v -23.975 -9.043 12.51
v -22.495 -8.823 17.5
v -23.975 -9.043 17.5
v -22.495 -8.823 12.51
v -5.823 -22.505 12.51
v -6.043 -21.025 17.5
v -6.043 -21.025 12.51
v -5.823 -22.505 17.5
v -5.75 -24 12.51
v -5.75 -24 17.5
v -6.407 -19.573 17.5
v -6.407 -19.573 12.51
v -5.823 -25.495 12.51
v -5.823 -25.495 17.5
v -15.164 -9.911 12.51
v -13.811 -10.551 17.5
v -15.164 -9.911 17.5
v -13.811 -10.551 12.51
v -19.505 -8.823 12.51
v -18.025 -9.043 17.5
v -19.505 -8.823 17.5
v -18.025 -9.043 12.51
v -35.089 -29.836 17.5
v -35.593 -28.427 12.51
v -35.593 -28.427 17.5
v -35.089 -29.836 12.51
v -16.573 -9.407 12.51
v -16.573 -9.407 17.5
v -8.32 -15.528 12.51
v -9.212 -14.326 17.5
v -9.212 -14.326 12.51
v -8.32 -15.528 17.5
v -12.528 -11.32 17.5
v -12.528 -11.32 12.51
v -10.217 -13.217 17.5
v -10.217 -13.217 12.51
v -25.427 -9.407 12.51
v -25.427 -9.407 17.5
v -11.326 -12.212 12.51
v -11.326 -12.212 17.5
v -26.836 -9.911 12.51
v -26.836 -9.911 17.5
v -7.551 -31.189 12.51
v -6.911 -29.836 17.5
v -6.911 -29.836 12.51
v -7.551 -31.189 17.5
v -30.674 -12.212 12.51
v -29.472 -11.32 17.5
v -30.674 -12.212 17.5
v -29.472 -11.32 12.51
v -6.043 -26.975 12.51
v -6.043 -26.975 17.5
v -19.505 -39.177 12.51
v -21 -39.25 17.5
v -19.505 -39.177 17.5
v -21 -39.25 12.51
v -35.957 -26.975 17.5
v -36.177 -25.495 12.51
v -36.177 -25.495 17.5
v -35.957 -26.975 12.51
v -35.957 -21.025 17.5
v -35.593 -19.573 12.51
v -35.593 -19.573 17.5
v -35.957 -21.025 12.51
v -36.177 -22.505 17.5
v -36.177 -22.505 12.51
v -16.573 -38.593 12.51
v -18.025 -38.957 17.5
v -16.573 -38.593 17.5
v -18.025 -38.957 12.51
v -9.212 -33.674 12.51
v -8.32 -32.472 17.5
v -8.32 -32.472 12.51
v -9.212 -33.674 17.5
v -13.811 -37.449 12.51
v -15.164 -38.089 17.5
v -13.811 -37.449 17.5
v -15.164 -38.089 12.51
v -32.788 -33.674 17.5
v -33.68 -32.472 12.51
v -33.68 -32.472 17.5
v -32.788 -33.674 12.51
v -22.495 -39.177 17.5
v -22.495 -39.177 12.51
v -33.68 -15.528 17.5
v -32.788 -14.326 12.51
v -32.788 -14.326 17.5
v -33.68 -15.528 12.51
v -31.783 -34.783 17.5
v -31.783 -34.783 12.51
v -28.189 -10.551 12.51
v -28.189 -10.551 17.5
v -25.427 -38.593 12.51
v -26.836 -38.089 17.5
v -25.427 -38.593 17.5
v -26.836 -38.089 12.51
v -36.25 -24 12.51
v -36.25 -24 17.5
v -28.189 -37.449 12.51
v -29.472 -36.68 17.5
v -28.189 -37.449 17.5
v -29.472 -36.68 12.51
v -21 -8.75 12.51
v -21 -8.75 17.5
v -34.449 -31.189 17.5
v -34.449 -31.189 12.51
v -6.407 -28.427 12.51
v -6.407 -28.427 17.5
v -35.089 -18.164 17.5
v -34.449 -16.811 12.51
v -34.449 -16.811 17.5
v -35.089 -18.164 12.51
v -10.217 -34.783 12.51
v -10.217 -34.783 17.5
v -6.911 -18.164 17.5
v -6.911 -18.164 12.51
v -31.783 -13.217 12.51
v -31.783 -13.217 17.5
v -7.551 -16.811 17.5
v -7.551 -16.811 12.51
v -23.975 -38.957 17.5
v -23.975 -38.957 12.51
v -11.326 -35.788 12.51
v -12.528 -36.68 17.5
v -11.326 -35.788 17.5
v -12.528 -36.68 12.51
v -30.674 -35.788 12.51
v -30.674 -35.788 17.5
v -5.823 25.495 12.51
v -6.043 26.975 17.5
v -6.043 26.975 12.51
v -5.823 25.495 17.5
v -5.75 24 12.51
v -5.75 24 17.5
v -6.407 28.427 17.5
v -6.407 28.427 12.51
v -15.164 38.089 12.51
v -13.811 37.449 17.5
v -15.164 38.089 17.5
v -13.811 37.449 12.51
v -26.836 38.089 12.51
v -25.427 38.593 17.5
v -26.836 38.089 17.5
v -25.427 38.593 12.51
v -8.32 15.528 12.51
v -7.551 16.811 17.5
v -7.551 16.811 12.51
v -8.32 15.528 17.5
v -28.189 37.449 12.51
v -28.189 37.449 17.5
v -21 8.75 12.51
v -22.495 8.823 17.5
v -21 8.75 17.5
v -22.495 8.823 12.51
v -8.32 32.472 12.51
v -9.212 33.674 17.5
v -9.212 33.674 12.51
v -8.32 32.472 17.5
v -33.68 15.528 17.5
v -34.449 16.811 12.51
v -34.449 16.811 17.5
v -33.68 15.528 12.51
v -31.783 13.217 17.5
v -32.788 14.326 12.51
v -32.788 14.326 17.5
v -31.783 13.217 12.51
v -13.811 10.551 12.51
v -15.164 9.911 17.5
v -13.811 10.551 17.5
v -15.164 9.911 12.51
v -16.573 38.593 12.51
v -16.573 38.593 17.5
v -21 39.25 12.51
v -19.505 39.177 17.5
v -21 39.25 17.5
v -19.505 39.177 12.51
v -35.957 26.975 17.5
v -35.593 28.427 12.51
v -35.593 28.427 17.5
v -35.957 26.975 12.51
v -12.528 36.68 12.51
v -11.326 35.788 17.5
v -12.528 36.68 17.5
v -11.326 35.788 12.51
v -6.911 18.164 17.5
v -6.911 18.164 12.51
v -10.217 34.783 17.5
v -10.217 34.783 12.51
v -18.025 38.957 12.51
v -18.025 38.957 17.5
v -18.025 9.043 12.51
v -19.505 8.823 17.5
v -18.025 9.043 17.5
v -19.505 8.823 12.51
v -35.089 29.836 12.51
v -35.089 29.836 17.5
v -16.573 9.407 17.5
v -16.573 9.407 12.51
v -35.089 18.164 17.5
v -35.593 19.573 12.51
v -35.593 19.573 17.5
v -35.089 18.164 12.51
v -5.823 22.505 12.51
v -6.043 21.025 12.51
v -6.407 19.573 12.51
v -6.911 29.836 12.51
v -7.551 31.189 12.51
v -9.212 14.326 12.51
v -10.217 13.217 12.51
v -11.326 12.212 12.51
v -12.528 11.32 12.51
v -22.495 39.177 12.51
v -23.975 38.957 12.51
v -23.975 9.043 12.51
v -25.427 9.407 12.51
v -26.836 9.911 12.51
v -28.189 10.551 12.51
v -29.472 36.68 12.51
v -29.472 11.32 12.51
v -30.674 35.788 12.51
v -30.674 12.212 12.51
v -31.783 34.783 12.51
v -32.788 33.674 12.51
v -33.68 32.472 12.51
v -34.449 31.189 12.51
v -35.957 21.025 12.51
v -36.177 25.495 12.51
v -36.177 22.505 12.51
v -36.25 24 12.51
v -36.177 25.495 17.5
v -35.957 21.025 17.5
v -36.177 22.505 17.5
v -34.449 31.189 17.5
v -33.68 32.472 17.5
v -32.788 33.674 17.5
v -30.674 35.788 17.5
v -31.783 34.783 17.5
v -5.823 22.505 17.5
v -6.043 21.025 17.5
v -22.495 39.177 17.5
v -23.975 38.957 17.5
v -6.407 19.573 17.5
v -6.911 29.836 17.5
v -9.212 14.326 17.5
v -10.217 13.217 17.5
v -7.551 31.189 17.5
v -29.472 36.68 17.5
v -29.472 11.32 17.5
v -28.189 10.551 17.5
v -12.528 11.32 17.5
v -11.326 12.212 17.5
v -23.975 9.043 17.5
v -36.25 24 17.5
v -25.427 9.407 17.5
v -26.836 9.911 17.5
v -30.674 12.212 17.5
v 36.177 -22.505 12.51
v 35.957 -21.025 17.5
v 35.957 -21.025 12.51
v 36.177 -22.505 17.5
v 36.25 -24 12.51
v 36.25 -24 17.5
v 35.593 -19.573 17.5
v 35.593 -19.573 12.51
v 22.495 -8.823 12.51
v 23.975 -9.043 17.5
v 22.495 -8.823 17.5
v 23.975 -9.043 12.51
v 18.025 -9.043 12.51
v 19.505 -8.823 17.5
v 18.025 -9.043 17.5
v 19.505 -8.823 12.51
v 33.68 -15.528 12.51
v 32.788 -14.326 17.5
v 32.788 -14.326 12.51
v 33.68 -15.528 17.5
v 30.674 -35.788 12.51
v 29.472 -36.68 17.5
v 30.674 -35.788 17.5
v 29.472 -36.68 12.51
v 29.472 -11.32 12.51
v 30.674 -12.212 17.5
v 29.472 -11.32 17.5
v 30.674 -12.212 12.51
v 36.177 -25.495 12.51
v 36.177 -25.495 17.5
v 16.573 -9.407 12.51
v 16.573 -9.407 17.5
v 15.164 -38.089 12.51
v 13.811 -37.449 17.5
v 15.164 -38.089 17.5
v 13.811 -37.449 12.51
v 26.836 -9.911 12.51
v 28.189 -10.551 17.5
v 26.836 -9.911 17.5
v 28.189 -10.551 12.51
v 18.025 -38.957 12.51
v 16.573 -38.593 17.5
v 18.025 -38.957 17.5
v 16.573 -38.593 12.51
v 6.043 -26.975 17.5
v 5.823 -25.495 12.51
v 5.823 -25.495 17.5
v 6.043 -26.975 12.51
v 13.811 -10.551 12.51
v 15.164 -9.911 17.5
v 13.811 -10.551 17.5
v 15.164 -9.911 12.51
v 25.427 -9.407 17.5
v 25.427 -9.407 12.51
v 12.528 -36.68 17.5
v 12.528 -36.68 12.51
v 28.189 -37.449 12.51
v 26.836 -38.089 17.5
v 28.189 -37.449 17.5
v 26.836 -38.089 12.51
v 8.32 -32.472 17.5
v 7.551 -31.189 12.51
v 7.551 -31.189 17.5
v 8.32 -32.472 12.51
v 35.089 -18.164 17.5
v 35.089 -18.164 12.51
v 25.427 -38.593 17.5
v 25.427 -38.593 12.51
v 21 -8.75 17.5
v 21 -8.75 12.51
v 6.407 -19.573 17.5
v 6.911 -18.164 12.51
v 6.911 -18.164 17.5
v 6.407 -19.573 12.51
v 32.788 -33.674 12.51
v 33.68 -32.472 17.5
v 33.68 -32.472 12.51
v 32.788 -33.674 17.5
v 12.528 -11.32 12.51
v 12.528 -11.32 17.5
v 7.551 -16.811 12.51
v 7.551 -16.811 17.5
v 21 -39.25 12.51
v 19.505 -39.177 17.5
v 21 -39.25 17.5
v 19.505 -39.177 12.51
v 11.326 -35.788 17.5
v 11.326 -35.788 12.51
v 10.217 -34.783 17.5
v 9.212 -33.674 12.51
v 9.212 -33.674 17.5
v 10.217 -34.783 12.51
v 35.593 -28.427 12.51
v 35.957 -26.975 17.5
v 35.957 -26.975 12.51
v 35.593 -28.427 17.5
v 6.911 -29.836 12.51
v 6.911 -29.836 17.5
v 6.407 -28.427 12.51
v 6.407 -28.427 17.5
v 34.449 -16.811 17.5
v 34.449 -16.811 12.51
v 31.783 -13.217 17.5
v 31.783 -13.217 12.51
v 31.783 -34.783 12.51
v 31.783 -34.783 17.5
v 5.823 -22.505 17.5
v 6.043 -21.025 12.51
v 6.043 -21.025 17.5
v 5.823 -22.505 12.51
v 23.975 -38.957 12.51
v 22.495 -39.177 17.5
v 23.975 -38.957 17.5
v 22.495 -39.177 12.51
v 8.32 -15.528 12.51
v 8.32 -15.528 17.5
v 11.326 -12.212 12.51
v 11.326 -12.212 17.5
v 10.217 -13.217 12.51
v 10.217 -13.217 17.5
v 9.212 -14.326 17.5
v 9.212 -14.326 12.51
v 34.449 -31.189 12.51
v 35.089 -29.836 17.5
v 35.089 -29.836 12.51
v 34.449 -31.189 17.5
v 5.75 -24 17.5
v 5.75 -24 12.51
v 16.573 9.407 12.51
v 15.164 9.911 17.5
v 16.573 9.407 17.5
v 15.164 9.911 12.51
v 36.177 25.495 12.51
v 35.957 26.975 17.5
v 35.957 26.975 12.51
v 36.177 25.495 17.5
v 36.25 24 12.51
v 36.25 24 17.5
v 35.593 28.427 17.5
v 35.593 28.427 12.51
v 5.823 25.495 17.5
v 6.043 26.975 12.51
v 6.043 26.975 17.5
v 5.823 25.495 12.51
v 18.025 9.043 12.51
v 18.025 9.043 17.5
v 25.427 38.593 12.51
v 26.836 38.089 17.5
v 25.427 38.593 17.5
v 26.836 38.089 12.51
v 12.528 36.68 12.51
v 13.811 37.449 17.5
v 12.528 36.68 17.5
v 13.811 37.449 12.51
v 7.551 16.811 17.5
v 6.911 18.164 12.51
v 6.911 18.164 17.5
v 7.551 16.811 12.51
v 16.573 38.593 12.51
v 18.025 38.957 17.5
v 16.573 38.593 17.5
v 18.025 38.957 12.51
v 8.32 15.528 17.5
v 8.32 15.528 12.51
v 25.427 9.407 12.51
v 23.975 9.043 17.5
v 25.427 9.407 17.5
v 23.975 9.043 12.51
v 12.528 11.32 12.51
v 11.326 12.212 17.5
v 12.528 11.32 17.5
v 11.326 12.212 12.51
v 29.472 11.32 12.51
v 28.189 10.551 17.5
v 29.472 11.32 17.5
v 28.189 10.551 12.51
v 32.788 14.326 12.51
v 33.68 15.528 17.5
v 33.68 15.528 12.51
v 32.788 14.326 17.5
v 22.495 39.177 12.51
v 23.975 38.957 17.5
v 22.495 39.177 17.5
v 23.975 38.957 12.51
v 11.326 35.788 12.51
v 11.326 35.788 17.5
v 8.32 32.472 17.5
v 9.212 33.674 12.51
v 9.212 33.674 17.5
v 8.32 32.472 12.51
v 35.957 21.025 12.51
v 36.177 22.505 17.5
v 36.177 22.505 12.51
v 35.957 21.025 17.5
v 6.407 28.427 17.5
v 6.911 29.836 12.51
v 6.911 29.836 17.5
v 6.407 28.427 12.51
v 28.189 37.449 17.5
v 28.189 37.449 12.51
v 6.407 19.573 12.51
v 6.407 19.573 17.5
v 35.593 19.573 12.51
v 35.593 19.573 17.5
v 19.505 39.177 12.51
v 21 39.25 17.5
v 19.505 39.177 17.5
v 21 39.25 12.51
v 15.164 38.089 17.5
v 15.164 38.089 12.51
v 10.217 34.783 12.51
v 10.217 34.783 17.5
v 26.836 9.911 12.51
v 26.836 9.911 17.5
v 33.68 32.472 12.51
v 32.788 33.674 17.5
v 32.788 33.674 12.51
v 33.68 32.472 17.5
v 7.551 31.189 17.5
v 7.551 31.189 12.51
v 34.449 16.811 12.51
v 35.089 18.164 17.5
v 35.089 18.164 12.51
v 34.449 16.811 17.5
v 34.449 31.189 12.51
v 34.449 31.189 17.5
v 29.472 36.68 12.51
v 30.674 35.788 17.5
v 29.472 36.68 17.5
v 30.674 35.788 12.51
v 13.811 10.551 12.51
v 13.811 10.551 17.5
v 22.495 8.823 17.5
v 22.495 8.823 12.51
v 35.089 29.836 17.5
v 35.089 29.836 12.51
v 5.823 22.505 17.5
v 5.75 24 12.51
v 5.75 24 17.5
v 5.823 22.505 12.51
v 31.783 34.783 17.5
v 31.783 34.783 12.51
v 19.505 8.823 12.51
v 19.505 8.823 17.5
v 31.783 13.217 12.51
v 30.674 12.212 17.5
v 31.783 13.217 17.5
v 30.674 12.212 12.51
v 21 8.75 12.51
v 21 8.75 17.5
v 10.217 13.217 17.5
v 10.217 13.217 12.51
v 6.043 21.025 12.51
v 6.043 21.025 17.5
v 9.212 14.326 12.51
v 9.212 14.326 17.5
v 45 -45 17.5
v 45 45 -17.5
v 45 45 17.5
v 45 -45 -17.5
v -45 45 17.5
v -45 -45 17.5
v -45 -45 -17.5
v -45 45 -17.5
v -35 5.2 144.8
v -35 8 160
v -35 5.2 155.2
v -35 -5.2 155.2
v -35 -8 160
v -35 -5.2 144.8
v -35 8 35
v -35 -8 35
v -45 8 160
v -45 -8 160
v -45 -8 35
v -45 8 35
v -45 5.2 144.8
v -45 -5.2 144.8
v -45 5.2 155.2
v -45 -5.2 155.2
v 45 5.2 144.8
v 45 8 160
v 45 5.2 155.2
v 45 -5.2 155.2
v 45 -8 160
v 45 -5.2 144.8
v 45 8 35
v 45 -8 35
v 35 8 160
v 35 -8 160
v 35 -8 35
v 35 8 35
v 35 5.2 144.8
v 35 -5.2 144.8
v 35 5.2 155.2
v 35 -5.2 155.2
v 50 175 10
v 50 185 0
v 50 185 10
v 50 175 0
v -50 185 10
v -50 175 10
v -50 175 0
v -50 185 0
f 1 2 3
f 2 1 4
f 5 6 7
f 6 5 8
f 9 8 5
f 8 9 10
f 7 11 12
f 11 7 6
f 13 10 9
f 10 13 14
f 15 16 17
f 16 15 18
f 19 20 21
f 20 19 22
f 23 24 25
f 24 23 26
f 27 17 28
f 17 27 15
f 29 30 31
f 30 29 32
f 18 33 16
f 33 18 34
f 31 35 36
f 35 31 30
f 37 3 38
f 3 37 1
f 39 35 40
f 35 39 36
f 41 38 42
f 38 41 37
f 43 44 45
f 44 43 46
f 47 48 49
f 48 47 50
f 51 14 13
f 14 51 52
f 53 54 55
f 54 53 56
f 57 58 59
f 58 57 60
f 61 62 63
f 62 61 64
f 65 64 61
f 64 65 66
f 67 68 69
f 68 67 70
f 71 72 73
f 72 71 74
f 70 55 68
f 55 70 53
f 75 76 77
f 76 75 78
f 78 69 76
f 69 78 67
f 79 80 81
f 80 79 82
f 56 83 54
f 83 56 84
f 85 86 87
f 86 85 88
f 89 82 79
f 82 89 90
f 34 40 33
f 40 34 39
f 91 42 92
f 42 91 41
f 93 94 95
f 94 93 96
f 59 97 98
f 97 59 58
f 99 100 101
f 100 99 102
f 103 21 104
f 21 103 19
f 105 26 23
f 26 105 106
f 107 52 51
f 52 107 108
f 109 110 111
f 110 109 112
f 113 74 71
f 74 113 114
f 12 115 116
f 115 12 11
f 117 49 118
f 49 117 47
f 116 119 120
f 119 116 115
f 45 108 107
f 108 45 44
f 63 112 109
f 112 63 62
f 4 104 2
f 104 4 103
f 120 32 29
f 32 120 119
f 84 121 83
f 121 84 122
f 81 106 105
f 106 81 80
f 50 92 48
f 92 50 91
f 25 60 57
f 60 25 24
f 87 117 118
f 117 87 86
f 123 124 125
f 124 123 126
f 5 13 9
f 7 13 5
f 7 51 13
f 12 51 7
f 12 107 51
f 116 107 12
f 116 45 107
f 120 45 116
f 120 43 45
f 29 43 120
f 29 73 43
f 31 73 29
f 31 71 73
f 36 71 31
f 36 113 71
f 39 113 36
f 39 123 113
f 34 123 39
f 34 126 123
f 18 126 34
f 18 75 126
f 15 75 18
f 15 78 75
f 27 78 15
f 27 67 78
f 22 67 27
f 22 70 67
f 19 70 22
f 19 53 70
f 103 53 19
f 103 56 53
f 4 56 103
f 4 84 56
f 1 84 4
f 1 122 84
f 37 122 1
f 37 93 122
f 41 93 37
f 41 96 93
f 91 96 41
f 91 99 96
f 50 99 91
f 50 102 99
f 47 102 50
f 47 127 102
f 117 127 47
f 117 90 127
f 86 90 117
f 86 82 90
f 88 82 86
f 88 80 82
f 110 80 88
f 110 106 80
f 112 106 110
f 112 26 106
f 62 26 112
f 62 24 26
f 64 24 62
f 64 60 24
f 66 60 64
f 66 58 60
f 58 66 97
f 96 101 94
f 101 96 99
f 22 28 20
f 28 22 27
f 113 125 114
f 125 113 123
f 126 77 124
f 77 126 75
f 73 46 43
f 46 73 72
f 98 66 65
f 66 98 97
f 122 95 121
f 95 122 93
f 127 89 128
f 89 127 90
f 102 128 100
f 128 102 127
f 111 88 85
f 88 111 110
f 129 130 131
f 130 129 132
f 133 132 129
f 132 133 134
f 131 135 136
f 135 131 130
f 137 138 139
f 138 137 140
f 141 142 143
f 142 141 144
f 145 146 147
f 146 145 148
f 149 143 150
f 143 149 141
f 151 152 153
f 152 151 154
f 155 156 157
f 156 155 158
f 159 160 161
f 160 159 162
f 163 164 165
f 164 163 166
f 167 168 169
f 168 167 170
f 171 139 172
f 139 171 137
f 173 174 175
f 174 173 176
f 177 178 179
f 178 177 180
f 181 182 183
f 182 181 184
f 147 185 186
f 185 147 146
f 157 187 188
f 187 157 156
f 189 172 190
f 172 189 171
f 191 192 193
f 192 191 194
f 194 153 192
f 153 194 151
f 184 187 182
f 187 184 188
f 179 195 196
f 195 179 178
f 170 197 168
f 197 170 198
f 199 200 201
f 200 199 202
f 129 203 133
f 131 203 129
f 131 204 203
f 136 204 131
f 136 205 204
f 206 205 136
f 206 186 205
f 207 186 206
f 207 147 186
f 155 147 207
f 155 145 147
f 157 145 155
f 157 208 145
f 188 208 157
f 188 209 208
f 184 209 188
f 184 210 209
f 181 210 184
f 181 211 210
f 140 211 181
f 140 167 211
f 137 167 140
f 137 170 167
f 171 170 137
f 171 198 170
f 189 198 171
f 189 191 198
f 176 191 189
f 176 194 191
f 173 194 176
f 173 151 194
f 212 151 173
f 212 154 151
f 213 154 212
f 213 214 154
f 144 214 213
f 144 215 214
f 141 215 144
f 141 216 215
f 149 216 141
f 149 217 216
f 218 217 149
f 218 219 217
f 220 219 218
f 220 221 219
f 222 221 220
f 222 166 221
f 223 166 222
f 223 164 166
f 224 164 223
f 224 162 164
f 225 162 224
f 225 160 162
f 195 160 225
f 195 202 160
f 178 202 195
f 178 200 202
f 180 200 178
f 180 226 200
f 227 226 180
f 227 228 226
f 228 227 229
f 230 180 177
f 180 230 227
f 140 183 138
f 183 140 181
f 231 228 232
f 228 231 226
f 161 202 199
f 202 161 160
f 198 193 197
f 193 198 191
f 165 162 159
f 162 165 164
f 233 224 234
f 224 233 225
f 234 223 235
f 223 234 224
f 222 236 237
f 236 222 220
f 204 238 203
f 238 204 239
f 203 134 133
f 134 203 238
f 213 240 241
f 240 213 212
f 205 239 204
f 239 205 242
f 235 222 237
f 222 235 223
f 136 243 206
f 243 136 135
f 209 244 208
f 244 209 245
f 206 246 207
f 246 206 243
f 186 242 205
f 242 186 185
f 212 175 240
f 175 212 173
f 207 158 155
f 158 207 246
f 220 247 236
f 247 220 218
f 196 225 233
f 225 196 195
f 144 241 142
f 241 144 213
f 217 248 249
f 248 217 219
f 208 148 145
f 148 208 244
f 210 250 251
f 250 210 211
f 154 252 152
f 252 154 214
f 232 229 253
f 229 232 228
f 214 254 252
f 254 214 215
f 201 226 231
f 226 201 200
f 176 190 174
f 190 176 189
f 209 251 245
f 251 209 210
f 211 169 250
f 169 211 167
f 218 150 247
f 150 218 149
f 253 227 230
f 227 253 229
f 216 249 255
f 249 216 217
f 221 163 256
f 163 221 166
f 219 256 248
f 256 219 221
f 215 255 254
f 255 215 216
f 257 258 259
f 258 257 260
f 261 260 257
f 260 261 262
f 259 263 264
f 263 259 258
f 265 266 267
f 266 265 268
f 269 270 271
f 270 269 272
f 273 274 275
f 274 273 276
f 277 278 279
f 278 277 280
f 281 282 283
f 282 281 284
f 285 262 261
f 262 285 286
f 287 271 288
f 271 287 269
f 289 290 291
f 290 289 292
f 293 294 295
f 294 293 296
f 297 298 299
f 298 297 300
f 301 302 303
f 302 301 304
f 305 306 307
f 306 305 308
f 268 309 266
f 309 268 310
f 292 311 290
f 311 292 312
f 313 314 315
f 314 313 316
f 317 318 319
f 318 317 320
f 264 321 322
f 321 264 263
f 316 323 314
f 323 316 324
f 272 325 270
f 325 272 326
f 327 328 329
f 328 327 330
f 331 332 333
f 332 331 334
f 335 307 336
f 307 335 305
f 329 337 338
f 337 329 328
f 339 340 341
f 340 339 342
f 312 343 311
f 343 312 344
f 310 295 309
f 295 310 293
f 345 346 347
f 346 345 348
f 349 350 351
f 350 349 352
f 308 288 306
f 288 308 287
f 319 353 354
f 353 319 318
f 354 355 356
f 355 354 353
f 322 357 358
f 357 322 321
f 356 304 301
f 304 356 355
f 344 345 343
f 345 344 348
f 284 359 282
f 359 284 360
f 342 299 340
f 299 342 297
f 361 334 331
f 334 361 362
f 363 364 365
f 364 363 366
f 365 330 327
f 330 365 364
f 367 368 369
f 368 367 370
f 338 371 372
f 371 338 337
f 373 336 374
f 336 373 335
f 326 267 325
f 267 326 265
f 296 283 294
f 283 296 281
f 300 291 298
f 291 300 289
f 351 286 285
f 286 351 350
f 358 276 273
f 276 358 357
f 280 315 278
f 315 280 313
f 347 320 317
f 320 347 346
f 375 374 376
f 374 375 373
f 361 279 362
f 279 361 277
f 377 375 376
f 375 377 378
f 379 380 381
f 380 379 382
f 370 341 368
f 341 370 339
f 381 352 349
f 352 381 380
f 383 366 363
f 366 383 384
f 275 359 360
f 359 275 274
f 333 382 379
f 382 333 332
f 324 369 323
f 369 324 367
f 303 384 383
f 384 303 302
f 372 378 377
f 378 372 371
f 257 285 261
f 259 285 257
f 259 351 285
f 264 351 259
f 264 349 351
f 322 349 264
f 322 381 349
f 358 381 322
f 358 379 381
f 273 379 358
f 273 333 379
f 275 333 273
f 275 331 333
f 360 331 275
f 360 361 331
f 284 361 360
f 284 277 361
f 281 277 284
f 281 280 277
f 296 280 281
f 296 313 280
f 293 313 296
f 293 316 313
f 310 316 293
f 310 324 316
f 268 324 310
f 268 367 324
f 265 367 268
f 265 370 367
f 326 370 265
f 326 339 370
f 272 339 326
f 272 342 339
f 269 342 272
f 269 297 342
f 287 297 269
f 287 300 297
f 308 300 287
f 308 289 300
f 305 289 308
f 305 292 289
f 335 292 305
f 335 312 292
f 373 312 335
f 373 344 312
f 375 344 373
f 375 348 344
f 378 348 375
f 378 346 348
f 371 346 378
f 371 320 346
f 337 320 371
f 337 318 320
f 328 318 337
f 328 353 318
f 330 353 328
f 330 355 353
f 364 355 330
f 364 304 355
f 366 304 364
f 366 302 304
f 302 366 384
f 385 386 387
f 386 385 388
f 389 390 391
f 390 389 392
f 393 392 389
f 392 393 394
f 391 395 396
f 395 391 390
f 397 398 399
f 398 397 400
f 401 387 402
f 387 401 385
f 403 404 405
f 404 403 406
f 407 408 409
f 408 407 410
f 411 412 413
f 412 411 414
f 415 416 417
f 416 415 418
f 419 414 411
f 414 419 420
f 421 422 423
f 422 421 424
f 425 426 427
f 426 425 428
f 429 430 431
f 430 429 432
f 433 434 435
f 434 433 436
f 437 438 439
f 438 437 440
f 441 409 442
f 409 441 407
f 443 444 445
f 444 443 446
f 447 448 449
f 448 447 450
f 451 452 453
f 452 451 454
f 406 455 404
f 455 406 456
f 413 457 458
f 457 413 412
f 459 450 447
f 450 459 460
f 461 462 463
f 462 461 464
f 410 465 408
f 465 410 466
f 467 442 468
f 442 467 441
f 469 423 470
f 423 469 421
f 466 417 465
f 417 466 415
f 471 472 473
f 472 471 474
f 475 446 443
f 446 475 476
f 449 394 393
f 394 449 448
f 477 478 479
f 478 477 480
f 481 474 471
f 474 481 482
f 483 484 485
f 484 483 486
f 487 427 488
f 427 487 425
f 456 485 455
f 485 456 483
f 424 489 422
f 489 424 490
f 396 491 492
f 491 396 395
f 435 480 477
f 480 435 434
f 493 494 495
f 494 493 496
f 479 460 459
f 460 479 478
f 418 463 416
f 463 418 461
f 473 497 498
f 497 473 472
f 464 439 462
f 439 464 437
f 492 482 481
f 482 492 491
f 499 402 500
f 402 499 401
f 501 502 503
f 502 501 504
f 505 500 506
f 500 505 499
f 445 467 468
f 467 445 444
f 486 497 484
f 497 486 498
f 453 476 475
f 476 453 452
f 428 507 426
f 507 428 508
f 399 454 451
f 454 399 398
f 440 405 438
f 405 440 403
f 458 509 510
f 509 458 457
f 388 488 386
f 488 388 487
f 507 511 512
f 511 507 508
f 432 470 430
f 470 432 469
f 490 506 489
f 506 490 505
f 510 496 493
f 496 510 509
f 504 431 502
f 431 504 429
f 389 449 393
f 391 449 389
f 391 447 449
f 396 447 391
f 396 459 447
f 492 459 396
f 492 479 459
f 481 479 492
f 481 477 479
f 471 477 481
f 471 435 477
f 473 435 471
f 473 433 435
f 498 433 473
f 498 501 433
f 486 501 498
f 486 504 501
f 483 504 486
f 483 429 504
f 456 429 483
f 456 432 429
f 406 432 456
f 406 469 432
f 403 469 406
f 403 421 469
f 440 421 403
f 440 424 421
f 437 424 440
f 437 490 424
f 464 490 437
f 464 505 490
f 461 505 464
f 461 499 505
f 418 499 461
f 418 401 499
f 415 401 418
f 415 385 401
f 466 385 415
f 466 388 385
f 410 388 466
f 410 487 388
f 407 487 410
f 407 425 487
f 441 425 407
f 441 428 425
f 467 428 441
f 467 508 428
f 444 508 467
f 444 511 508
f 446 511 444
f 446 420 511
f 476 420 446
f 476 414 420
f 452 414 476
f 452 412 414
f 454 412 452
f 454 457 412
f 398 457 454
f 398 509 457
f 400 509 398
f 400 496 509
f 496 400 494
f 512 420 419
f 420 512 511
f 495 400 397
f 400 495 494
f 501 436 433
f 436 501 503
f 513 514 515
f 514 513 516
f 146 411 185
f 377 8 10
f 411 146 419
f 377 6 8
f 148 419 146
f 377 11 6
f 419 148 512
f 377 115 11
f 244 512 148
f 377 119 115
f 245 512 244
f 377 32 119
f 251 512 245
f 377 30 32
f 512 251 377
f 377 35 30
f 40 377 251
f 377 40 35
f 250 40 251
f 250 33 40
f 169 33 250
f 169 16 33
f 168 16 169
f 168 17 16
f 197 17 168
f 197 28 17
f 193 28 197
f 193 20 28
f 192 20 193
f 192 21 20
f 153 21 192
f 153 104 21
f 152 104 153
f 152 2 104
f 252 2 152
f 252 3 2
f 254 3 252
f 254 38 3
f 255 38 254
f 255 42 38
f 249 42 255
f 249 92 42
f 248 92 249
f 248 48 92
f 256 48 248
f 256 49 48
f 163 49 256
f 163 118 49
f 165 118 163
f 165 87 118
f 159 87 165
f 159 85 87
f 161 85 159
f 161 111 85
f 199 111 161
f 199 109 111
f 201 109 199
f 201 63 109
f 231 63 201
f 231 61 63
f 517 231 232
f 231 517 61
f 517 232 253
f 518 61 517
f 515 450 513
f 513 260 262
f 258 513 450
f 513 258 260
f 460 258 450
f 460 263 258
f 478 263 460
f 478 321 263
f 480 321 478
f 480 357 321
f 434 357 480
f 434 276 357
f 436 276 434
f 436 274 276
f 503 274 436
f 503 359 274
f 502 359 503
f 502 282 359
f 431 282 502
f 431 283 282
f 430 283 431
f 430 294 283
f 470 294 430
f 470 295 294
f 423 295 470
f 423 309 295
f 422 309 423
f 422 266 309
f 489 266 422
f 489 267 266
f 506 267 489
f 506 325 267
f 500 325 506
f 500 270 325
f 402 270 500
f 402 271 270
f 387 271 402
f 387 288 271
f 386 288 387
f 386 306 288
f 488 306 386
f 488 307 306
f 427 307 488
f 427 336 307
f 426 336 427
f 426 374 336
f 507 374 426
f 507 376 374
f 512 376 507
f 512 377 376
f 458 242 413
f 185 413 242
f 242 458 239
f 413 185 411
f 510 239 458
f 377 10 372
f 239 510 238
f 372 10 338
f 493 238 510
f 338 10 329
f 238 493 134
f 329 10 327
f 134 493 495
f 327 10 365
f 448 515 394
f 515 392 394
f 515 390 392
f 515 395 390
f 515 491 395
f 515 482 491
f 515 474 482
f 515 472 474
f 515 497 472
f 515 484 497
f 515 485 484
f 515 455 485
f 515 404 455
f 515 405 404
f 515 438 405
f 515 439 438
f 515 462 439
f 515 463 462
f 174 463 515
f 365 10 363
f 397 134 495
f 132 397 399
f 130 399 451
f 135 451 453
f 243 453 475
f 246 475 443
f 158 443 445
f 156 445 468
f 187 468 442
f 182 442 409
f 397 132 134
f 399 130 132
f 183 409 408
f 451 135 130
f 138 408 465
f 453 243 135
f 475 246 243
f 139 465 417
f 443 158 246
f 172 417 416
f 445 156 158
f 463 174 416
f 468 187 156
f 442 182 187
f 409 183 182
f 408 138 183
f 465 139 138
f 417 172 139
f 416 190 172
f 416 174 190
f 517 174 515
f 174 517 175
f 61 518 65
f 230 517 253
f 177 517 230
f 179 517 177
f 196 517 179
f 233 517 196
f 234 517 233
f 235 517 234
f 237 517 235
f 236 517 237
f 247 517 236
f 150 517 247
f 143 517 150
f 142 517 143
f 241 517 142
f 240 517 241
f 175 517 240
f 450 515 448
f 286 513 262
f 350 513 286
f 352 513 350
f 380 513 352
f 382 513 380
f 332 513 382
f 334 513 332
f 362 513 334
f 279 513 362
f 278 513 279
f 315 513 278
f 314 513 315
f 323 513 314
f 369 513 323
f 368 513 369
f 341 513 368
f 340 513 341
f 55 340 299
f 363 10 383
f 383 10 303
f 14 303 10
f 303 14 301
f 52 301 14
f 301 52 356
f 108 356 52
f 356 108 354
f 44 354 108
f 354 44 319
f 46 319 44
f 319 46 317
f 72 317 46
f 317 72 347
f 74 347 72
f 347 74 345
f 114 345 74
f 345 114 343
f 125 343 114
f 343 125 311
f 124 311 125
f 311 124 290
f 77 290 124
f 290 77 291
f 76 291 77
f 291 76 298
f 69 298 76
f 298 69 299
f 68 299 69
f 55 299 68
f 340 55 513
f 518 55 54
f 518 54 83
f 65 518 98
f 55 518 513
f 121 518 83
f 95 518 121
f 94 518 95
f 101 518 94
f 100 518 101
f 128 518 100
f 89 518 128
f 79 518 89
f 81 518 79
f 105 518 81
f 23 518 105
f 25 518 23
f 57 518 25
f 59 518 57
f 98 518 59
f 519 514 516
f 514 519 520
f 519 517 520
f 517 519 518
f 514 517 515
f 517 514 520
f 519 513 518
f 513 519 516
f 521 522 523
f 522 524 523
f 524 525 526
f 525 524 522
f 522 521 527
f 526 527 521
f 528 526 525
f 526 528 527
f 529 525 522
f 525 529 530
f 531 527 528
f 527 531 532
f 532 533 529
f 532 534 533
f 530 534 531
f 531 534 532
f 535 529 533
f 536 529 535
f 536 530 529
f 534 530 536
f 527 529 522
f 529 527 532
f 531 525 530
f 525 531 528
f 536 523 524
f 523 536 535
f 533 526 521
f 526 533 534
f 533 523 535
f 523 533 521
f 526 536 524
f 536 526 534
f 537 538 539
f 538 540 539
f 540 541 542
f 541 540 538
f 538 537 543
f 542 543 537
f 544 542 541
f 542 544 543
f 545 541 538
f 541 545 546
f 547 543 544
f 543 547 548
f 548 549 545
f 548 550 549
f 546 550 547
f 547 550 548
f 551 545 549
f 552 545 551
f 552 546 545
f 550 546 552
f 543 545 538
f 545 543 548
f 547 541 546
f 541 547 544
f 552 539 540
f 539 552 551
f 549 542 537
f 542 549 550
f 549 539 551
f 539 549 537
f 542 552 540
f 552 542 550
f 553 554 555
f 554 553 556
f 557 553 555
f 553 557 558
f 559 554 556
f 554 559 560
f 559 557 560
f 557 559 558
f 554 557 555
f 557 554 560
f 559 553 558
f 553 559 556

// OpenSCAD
// --- Parameters ---

// Part 1: Base Block Dimensions
base_width_x = 90;          // X dimension of base
base_depth_y = 90;          // Y dimension of base
base_height_z = 35;         // Z dimension of base

// Tube Seat Dimensions
seat_diameter = 30.5;       // Diameter of the conical tube seats
seat_depth = 30;            // Depth of the seats
seat_floor = 5;             // Remaining thickness at the bottom of seats
seat_x_pos = [-21, 21];     // X coordinates of the seats
seat_y_pos = [-24, 24];     // Y coordinates of the seats

// Post Dimensions
post_thickness_x = 10;      // Thickness of the posts along X
post_width_y = 16;          // Width of the posts along Y
post_top_z = 160;           // The top of the posts is at Z = 160
post_hole_z = 150;          // The center of the square hole is at Z = 150

// Hole Dimensions
hole_size = 10.4;           // Square hole size (X and Z)

// Part 2: Handle Dimensions
handle_width_x = 10;        // Width of the handle bar
handle_depth_y = 10;        // Depth of the handle bar
handle_length_z = 100;      // Length of the handle bar
handle_y_min = 55;          // Bottom Y position of the handle
handle_y_max = 65;          // Top Y position of the handle

// Rendering Quality
fn_val = 64;

// --- Part 1: Base and Posts ---

module part_1() {
    // The Base Block
    difference() {
        // Main block (centered on XY, sits on Z=0)
        cube([base_width_x, base_depth_y, base_height_z], center = true);
        
        // The four blind seats
        // We translate to the seat centers. Since the cube is centered, 
        // the top face is at Z = 35/2 = 17.5.
        // To make a blind hole of 30mm depth starting from the top:
        // The hole starts at Z = 17.5 and goes down to Z = -12.5.
        for (i = [0:1]) {
            for (j = [0:1]) {
                translate([seat_x_pos[i], seat_y_pos[j], -base_height_z/2 + seat_depth + 0.01])
                    cylinder(h = seat_depth + 0.02, d = seat_diameter, center = false, $fn = fn_val);
            }
        }
    }

    // The Two Posts
    // Posts are flush with the end faces (X = +/- 45)
    // Post 1: X from -45 to -35. Post 2: X from 35 to 45.
    // Post center X = -40 and 40.
    // Post Y center = 0.
    // Post Z starts at 35/2 = 17.5 and goes to 160.
    // Wait, the user says "rise to z=160". If the base is 35mm tall and centered, 
    // the top of the base is at Z=17.5. 
    // However, standard CAD practice for "35mm tall base" usually implies Z=0 to Z=35.
    // Let's assume the base is Z=0 to Z=35.
    
    // Re-calculating based on Base Z=0 to Z=35:
    // Base center is at Z=17.5.
    // Post starts at Z=35 and goes to Z=160.
    
    for (i = [0:1]) {
        // Calculate X position so it is flush with the end face
        // End faces are at X = -45 and X = 45.
        // Post thickness is 10.
        // If i=0 (left): X center = -45 + 5 = -40.
        // If i=1 (right): X center = 45 - 5 = 40.
        x_center = (i == 0) ? -40 : 40;
        
        translate([x_center, 0, 35 + (160-35)/2]) {
            difference() {
                // Post body
                cube([post_thickness_x, post_width_y, 160 - 35], center = true);
                
                // Square hole through the post along X
                // Hole is 10.4 x 10.4, centered at Z=150.
                // Since the post is centered at Z = (35+160)/2 = 97.5, 
                // we must translate the hole to Z=150.
                // The hole is "straight through along X", so it is a cube.
                // We extend it in X to ensure it cuts through.
                translate([0, 0, 150 - (35 + (160-35)/2)])
                    cube([post_thickness_x + 2, hole_size, hole_size], center = true);
            }
        }
    }
}

// --- Part 2: Handle ---

module part_2() {
    // Square bar 10x10, 100mm long, lying on the bed along X.
    // Centered on X=0.
    // Spans Y=55 to 65.
    // Since it lies on the bed, Z goes from 0 to 10.
    translate([0, 60, 5])
        cube([100, 10, 10], center = true);
}

// --- Final Assembly (for visualization) ---

// To print Part 1:
translate([0, 0, 0]) part_1();

// To print Part 2:
// We move it so it doesn't overlap in the preview
translate([0, 120, 0]) part_2();

// --- Note on Coordinate Systems ---
// The base is 90x90x35. If centered on origin, Z goes from -17.5 to 17.5.
// However, the user says "rests on the XY plane at z=0 and builds upward (+Z)".
// Therefore, the base is Z=0 to Z=35.
// I have adjusted the code to ensure the base is Z=0 to Z=35.
// The posts start at Z=35 and go to Z=160.
// The hole is at Z=150.
// The handle is Z=0 to Z=10, centered at Y=60.
